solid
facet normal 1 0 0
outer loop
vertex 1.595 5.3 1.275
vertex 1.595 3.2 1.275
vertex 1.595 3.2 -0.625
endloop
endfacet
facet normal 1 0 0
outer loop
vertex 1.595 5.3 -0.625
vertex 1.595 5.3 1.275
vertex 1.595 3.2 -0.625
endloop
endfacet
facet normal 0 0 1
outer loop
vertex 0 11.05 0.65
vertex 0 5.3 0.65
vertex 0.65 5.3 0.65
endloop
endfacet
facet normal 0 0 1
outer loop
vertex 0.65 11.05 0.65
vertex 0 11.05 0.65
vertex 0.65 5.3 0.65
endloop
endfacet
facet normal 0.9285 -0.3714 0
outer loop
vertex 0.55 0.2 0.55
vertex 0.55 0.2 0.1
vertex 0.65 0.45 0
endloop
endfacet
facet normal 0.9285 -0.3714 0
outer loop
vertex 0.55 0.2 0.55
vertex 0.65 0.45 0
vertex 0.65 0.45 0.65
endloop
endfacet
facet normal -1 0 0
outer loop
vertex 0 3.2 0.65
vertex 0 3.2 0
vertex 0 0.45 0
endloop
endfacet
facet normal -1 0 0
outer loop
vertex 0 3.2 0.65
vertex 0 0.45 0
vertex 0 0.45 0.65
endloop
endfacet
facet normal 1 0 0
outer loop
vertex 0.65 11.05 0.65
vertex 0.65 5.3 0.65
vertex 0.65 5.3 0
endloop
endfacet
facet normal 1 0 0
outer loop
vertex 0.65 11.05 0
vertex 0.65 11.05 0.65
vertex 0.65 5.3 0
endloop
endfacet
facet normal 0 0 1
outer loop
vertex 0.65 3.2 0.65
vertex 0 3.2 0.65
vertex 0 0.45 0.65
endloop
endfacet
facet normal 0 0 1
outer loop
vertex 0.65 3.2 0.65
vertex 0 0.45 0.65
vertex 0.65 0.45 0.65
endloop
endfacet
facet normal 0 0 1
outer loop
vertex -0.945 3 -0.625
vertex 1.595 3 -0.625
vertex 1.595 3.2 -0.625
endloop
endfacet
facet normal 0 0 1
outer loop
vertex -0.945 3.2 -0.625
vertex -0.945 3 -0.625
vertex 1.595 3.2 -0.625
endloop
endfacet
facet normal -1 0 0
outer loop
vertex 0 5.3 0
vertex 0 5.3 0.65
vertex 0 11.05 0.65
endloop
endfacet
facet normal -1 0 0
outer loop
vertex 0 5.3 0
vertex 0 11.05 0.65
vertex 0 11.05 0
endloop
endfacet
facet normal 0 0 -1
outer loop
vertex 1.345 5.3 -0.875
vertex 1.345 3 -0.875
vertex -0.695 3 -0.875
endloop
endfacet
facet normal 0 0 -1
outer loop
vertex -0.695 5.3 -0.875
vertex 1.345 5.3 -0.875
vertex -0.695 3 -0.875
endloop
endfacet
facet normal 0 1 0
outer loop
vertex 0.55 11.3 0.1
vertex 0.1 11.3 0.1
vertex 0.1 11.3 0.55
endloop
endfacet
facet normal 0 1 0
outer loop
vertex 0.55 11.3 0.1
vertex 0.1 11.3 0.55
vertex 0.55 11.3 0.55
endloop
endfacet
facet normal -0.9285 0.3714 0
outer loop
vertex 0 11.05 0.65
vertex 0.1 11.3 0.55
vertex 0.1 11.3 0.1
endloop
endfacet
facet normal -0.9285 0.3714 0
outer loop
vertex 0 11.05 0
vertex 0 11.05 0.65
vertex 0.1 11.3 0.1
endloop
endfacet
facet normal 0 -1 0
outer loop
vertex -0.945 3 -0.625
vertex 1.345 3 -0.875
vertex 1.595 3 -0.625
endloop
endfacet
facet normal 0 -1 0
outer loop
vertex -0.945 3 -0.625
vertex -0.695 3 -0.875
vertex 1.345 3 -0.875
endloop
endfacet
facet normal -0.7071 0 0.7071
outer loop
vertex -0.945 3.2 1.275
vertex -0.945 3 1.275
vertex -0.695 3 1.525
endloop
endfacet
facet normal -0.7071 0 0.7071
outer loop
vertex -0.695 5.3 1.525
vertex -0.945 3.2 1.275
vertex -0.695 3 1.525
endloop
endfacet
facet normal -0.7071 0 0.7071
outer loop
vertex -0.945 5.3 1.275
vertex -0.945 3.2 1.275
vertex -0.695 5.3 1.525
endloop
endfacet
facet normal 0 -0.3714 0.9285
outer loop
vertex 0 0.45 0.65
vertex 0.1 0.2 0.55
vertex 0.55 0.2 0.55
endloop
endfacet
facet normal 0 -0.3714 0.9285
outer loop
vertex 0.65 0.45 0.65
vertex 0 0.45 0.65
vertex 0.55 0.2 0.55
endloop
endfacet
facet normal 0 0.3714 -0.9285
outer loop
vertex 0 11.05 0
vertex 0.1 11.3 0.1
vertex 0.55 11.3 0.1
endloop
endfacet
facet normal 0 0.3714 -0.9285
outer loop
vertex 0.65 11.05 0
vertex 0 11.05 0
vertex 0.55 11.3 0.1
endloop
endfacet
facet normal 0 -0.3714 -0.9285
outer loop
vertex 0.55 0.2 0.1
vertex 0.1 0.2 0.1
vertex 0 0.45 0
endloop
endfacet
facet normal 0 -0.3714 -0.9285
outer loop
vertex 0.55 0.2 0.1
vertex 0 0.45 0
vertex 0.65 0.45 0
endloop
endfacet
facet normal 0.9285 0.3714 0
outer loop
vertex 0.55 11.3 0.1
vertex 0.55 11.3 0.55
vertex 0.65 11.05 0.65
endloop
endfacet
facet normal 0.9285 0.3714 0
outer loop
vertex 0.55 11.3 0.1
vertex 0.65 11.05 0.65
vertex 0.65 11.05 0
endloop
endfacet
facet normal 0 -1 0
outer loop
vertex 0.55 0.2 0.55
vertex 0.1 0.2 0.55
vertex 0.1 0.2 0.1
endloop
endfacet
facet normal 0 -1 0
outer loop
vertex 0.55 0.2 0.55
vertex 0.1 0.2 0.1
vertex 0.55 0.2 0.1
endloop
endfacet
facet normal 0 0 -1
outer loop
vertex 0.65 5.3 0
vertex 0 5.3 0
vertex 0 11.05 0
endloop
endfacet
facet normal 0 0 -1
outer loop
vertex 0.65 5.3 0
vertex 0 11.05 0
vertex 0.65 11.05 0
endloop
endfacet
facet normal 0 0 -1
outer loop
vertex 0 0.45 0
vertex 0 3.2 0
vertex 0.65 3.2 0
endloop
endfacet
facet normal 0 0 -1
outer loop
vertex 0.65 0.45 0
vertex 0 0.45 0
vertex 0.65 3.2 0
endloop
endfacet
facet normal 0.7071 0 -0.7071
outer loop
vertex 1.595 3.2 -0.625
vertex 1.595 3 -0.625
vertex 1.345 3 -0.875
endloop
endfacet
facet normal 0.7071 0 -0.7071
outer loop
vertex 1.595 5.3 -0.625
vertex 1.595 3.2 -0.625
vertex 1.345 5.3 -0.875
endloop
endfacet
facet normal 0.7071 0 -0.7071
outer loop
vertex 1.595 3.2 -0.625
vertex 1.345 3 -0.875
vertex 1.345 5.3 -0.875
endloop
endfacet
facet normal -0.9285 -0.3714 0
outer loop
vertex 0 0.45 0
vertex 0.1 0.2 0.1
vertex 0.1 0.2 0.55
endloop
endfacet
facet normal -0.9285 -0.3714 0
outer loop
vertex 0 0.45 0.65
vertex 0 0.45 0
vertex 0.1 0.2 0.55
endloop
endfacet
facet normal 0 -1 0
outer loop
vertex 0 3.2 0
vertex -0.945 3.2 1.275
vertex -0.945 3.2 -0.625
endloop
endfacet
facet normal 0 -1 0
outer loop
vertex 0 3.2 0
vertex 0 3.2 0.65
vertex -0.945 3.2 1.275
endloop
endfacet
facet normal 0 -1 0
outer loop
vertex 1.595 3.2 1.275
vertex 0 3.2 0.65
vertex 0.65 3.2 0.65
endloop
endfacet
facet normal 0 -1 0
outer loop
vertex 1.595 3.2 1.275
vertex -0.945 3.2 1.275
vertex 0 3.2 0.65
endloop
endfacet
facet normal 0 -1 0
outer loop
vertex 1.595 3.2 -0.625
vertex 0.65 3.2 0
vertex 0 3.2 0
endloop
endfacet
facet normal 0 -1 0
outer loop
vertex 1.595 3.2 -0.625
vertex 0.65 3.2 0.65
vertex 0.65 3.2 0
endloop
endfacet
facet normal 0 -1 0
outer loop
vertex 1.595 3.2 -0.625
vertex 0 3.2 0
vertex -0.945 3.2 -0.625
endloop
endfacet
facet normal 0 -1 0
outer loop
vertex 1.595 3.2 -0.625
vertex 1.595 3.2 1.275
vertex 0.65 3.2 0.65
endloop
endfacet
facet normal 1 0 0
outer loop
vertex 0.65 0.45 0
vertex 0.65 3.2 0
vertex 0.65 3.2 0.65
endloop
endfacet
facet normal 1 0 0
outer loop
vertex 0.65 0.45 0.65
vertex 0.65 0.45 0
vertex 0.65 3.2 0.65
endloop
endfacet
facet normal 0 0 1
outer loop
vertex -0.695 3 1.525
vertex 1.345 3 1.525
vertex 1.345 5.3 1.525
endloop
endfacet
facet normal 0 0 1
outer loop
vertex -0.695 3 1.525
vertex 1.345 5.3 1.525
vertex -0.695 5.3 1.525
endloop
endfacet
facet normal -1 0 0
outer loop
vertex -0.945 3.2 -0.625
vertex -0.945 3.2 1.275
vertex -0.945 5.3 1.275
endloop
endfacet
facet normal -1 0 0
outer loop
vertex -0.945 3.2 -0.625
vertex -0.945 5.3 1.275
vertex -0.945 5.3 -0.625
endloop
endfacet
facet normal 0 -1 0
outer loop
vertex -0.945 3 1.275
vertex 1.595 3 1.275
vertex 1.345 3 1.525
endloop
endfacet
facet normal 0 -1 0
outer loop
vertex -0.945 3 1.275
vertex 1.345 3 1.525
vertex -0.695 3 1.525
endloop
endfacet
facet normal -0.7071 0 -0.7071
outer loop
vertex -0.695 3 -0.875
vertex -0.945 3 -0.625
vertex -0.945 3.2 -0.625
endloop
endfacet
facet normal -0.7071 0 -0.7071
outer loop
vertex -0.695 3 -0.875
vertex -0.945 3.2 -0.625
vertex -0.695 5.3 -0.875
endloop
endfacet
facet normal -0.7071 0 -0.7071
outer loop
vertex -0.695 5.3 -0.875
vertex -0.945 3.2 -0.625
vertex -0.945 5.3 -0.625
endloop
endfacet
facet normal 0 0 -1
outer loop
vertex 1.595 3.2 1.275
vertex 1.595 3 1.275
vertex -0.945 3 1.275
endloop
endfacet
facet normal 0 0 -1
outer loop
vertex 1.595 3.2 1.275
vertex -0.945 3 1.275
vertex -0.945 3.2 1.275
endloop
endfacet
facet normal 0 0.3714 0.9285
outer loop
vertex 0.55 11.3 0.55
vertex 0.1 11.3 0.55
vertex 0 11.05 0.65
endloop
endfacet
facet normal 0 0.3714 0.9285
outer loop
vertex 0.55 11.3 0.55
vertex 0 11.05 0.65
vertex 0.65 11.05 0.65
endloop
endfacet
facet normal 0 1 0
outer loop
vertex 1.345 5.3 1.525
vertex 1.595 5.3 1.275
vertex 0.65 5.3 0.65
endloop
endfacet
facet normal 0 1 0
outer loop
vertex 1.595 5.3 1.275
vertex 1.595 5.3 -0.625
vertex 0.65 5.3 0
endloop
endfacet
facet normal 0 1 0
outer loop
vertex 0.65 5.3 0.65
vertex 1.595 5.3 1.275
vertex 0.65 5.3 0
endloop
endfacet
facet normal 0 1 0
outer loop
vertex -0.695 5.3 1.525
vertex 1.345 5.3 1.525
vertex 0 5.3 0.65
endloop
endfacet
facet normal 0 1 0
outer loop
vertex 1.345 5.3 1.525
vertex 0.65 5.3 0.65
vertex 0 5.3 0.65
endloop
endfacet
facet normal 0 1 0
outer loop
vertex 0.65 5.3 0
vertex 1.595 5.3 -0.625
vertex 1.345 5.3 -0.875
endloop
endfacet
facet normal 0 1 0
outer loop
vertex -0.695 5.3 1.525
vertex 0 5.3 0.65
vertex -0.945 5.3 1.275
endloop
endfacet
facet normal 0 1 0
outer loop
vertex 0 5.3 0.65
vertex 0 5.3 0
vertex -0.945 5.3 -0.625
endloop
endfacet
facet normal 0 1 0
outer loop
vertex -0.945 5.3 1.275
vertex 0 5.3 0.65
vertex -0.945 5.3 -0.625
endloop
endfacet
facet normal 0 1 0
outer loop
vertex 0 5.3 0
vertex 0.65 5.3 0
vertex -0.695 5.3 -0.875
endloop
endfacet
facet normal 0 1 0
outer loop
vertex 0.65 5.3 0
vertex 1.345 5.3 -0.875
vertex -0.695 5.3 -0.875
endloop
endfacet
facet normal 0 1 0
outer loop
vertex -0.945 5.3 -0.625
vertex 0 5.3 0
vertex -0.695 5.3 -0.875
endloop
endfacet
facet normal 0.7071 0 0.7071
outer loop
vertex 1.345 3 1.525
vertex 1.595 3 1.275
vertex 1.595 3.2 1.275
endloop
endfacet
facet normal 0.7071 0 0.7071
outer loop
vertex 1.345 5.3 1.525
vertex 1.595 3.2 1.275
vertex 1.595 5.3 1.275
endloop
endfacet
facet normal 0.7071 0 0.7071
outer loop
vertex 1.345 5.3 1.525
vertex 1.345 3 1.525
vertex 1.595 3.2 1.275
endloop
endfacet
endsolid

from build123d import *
from OCP.BRepFilletAPI import BRepFilletAPI_MakeChamfer

# Parameters (mm, degrees)
SKETCH1_W           = 0.65
SKETCH1_H           = 0.65
BOSS_EXTRUDE1_DEPTH = 11.3
CHAMFER1_SIZE       = 0.25
CHAMFER1_SIZE2      = 0.1
CHAMFER2_SIZE       = 0.1
CHAMFER2_SIZE2      = 0.25
SKETCH2_W           = 2.54
SKETCH2_H           = 2.4
BOSS_EXTRUDE2_DEPTH = 2.3
CHAMFER3_SIZE       = 0.25
SKETCH6_W           = 1.9
SKETCH6_H           = 0.2
CUT_EXTRUDE5_DEPTH  = 6
SKETCH7_W           = 0.65
SKETCH7_H           = 0.65
BOSS_EXTRUDE4_DEPTH = 3
CHAMFER5_SIZE       = 0.25
CHAMFER5_SIZE2      = 0.1


with BuildPart() as part:
    # Sketch1 → Boss-Extrude1 (new body)
    with BuildSketch(Plane(origin=(0, 0, 0), x_dir=(1, 0, 0), z_dir=(0, 1, 0))):
        with Locations((0.325, -0.325)):
            Rectangle(SKETCH1_W, SKETCH1_H)
    extrude(amount=BOSS_EXTRUDE1_DEPTH)

    # Chamfer1: one chamfer whose edges measure the first distance from different faces: ONE call of the kernel's chamfer builder (chamfer() names one face for all edges)
    chamfer1_edges_1 = [part.edges().sort_by_distance(p)[0] for p in [
        (0.65, 11.3, 0.325),
    ]]
    chamfer1_side_1 = [part.faces().sort_by_distance(p)[0] for p in [
        (0.65, 5.65, 0.325),
    ]]
    chamfer1_edges_2 = [part.edges().sort_by_distance(p)[0] for p in [
        (0.325, 11.3, 0),
    ]]
    chamfer1_side_2 = [part.faces().sort_by_distance(p)[0] for p in [
        (0.325, 5.65, 0),
    ]]
    chamfer1_edges_3 = [part.edges().sort_by_distance(p)[0] for p in [
        (0, 11.3, 0.325),
    ]]
    chamfer1_side_3 = [part.faces().sort_by_distance(p)[0] for p in [
        (0, 5.65, 0.325),
    ]]
    chamfer1_edges_4 = [part.edges().sort_by_distance(p)[0] for p in [
        (0.325, 11.3, 0.65),
    ]]
    chamfer1_side_4 = [part.faces().sort_by_distance(p)[0] for p in [
        (0.325, 5.65, 0.65),
    ]]
    chamfer1 = BRepFilletAPI_MakeChamfer(part.part.solid().wrapped)
    for e in chamfer1_edges_1:
        chamfer1.Add(CHAMFER1_SIZE, CHAMFER1_SIZE2, e.wrapped, chamfer1_side_1[0].wrapped)  # the first distance lies on this face
    for e in chamfer1_edges_2:
        chamfer1.Add(CHAMFER1_SIZE, CHAMFER1_SIZE2, e.wrapped, chamfer1_side_2[0].wrapped)  # the first distance lies on this face
    for e in chamfer1_edges_3:
        chamfer1.Add(CHAMFER1_SIZE, CHAMFER1_SIZE2, e.wrapped, chamfer1_side_3[0].wrapped)  # the first distance lies on this face
    for e in chamfer1_edges_4:
        chamfer1.Add(CHAMFER1_SIZE, CHAMFER1_SIZE2, e.wrapped, chamfer1_side_4[0].wrapped)  # the first distance lies on this face
    add(Compound.cast(chamfer1.Shape()), mode=Mode.REPLACE)

    # Chamfer2
    chamfer2_edges = [part.edges().sort_by_distance(p)[0] for p in [
        (0.325, 0, 0),
        (0.65, 0, 0.325),
        (0.325, 0, 0.65),
        (0, 0, 0.325),
    ]]
    chamfer2_side = [part.faces().sort_by_distance(p)[0] for p in [
        (0.325, 0, 0.325),
    ]]
    chamfer(chamfer2_edges, length=CHAMFER2_SIZE, length2=CHAMFER2_SIZE2, reference=chamfer2_side[0])

    # Sketch2 → Boss-Extrude2 (add)
    with BuildSketch(Plane(origin=(0, 3, 0), x_dir=(-1, 0, 0), z_dir=(0, -1, 0))):
        with Locations((-0.325, -0.325)):
            Rectangle(SKETCH2_W, SKETCH2_H)
    extrude(amount=-BOSS_EXTRUDE2_DEPTH)

    # Chamfer3
    chamfer3_edges = [part.edges().sort_by_distance(p)[0] for p in [
        (1.595, 4.15, 1.525),
        (1.595, 4.15, -0.875),
        (-0.945, 4.15, -0.875),
        (-0.945, 4.15, 1.525),
    ]]
    chamfer(chamfer3_edges, length=CHAMFER3_SIZE)

    # Sketch6 → Cut-Extrude5 (cut)
    with BuildSketch(Plane(origin=(1.595, 0, 0), x_dir=(0, 0, -1), z_dir=(1, 0, 0))):
        with Locations((-0.325, 3.1)):
            Rectangle(SKETCH6_W, SKETCH6_H)
    extrude(amount=-CUT_EXTRUDE5_DEPTH, mode=Mode.SUBTRACT)


with BuildPart() as body_2:
    # of the pieces the cut leaves, the one that is kept (cut_extrude5_keep)
    add(part.part.solids().sort_by_distance((1.345, 3, -0.875))[0])

    # Sketch7 → Boss-Extrude4 (add)
    with BuildSketch(Plane.XZ.offset(-3.2)):
        with Locations((0.325, 0.325)):
            Rectangle(SKETCH7_W, SKETCH7_H)
    extrude(amount=BOSS_EXTRUDE4_DEPTH)

    # Chamfer5: one chamfer whose edges measure the first distance from different faces: ONE call of the kernel's chamfer builder (chamfer() names one face for all edges)
    chamfer5_edges_1 = [body_2.edges().sort_by_distance(p)[0] for p in [
        (0, 0.2, 0.325),
    ]]
    chamfer5_side_1 = [body_2.faces().sort_by_distance(p)[0] for p in [
        (0, 1.7, 0.325),
    ]]
    chamfer5_edges_2 = [body_2.edges().sort_by_distance(p)[0] for p in [
        (0.325, 0.2, 0),
    ]]
    chamfer5_side_2 = [body_2.faces().sort_by_distance(p)[0] for p in [
        (0.325, 1.7, 0),
    ]]
    chamfer5_edges_3 = [body_2.edges().sort_by_distance(p)[0] for p in [
        (0.65, 0.2, 0.325),
    ]]
    chamfer5_side_3 = [body_2.faces().sort_by_distance(p)[0] for p in [
        (0.65, 1.7, 0.325),
    ]]
    chamfer5_edges_4 = [body_2.edges().sort_by_distance(p)[0] for p in [
        (0.325, 0.2, 0.65),
    ]]
    chamfer5_side_4 = [body_2.faces().sort_by_distance(p)[0] for p in [
        (0.325, 1.7, 0.65),
    ]]
    chamfer5 = BRepFilletAPI_MakeChamfer(body_2.part.solid().wrapped)
    for e in chamfer5_edges_1:
        chamfer5.Add(CHAMFER5_SIZE, CHAMFER5_SIZE2, e.wrapped, chamfer5_side_1[0].wrapped)  # the first distance lies on this face
    for e in chamfer5_edges_2:
        chamfer5.Add(CHAMFER5_SIZE, CHAMFER5_SIZE2, e.wrapped, chamfer5_side_2[0].wrapped)  # the first distance lies on this face
    for e in chamfer5_edges_3:
        chamfer5.Add(CHAMFER5_SIZE, CHAMFER5_SIZE2, e.wrapped, chamfer5_side_3[0].wrapped)  # the first distance lies on this face
    for e in chamfer5_edges_4:
        chamfer5.Add(CHAMFER5_SIZE, CHAMFER5_SIZE2, e.wrapped, chamfer5_side_4[0].wrapped)  # the first distance lies on this face
    add(Compound.cast(chamfer5.Shape()), mode=Mode.REPLACE)


solid = body_2.part
